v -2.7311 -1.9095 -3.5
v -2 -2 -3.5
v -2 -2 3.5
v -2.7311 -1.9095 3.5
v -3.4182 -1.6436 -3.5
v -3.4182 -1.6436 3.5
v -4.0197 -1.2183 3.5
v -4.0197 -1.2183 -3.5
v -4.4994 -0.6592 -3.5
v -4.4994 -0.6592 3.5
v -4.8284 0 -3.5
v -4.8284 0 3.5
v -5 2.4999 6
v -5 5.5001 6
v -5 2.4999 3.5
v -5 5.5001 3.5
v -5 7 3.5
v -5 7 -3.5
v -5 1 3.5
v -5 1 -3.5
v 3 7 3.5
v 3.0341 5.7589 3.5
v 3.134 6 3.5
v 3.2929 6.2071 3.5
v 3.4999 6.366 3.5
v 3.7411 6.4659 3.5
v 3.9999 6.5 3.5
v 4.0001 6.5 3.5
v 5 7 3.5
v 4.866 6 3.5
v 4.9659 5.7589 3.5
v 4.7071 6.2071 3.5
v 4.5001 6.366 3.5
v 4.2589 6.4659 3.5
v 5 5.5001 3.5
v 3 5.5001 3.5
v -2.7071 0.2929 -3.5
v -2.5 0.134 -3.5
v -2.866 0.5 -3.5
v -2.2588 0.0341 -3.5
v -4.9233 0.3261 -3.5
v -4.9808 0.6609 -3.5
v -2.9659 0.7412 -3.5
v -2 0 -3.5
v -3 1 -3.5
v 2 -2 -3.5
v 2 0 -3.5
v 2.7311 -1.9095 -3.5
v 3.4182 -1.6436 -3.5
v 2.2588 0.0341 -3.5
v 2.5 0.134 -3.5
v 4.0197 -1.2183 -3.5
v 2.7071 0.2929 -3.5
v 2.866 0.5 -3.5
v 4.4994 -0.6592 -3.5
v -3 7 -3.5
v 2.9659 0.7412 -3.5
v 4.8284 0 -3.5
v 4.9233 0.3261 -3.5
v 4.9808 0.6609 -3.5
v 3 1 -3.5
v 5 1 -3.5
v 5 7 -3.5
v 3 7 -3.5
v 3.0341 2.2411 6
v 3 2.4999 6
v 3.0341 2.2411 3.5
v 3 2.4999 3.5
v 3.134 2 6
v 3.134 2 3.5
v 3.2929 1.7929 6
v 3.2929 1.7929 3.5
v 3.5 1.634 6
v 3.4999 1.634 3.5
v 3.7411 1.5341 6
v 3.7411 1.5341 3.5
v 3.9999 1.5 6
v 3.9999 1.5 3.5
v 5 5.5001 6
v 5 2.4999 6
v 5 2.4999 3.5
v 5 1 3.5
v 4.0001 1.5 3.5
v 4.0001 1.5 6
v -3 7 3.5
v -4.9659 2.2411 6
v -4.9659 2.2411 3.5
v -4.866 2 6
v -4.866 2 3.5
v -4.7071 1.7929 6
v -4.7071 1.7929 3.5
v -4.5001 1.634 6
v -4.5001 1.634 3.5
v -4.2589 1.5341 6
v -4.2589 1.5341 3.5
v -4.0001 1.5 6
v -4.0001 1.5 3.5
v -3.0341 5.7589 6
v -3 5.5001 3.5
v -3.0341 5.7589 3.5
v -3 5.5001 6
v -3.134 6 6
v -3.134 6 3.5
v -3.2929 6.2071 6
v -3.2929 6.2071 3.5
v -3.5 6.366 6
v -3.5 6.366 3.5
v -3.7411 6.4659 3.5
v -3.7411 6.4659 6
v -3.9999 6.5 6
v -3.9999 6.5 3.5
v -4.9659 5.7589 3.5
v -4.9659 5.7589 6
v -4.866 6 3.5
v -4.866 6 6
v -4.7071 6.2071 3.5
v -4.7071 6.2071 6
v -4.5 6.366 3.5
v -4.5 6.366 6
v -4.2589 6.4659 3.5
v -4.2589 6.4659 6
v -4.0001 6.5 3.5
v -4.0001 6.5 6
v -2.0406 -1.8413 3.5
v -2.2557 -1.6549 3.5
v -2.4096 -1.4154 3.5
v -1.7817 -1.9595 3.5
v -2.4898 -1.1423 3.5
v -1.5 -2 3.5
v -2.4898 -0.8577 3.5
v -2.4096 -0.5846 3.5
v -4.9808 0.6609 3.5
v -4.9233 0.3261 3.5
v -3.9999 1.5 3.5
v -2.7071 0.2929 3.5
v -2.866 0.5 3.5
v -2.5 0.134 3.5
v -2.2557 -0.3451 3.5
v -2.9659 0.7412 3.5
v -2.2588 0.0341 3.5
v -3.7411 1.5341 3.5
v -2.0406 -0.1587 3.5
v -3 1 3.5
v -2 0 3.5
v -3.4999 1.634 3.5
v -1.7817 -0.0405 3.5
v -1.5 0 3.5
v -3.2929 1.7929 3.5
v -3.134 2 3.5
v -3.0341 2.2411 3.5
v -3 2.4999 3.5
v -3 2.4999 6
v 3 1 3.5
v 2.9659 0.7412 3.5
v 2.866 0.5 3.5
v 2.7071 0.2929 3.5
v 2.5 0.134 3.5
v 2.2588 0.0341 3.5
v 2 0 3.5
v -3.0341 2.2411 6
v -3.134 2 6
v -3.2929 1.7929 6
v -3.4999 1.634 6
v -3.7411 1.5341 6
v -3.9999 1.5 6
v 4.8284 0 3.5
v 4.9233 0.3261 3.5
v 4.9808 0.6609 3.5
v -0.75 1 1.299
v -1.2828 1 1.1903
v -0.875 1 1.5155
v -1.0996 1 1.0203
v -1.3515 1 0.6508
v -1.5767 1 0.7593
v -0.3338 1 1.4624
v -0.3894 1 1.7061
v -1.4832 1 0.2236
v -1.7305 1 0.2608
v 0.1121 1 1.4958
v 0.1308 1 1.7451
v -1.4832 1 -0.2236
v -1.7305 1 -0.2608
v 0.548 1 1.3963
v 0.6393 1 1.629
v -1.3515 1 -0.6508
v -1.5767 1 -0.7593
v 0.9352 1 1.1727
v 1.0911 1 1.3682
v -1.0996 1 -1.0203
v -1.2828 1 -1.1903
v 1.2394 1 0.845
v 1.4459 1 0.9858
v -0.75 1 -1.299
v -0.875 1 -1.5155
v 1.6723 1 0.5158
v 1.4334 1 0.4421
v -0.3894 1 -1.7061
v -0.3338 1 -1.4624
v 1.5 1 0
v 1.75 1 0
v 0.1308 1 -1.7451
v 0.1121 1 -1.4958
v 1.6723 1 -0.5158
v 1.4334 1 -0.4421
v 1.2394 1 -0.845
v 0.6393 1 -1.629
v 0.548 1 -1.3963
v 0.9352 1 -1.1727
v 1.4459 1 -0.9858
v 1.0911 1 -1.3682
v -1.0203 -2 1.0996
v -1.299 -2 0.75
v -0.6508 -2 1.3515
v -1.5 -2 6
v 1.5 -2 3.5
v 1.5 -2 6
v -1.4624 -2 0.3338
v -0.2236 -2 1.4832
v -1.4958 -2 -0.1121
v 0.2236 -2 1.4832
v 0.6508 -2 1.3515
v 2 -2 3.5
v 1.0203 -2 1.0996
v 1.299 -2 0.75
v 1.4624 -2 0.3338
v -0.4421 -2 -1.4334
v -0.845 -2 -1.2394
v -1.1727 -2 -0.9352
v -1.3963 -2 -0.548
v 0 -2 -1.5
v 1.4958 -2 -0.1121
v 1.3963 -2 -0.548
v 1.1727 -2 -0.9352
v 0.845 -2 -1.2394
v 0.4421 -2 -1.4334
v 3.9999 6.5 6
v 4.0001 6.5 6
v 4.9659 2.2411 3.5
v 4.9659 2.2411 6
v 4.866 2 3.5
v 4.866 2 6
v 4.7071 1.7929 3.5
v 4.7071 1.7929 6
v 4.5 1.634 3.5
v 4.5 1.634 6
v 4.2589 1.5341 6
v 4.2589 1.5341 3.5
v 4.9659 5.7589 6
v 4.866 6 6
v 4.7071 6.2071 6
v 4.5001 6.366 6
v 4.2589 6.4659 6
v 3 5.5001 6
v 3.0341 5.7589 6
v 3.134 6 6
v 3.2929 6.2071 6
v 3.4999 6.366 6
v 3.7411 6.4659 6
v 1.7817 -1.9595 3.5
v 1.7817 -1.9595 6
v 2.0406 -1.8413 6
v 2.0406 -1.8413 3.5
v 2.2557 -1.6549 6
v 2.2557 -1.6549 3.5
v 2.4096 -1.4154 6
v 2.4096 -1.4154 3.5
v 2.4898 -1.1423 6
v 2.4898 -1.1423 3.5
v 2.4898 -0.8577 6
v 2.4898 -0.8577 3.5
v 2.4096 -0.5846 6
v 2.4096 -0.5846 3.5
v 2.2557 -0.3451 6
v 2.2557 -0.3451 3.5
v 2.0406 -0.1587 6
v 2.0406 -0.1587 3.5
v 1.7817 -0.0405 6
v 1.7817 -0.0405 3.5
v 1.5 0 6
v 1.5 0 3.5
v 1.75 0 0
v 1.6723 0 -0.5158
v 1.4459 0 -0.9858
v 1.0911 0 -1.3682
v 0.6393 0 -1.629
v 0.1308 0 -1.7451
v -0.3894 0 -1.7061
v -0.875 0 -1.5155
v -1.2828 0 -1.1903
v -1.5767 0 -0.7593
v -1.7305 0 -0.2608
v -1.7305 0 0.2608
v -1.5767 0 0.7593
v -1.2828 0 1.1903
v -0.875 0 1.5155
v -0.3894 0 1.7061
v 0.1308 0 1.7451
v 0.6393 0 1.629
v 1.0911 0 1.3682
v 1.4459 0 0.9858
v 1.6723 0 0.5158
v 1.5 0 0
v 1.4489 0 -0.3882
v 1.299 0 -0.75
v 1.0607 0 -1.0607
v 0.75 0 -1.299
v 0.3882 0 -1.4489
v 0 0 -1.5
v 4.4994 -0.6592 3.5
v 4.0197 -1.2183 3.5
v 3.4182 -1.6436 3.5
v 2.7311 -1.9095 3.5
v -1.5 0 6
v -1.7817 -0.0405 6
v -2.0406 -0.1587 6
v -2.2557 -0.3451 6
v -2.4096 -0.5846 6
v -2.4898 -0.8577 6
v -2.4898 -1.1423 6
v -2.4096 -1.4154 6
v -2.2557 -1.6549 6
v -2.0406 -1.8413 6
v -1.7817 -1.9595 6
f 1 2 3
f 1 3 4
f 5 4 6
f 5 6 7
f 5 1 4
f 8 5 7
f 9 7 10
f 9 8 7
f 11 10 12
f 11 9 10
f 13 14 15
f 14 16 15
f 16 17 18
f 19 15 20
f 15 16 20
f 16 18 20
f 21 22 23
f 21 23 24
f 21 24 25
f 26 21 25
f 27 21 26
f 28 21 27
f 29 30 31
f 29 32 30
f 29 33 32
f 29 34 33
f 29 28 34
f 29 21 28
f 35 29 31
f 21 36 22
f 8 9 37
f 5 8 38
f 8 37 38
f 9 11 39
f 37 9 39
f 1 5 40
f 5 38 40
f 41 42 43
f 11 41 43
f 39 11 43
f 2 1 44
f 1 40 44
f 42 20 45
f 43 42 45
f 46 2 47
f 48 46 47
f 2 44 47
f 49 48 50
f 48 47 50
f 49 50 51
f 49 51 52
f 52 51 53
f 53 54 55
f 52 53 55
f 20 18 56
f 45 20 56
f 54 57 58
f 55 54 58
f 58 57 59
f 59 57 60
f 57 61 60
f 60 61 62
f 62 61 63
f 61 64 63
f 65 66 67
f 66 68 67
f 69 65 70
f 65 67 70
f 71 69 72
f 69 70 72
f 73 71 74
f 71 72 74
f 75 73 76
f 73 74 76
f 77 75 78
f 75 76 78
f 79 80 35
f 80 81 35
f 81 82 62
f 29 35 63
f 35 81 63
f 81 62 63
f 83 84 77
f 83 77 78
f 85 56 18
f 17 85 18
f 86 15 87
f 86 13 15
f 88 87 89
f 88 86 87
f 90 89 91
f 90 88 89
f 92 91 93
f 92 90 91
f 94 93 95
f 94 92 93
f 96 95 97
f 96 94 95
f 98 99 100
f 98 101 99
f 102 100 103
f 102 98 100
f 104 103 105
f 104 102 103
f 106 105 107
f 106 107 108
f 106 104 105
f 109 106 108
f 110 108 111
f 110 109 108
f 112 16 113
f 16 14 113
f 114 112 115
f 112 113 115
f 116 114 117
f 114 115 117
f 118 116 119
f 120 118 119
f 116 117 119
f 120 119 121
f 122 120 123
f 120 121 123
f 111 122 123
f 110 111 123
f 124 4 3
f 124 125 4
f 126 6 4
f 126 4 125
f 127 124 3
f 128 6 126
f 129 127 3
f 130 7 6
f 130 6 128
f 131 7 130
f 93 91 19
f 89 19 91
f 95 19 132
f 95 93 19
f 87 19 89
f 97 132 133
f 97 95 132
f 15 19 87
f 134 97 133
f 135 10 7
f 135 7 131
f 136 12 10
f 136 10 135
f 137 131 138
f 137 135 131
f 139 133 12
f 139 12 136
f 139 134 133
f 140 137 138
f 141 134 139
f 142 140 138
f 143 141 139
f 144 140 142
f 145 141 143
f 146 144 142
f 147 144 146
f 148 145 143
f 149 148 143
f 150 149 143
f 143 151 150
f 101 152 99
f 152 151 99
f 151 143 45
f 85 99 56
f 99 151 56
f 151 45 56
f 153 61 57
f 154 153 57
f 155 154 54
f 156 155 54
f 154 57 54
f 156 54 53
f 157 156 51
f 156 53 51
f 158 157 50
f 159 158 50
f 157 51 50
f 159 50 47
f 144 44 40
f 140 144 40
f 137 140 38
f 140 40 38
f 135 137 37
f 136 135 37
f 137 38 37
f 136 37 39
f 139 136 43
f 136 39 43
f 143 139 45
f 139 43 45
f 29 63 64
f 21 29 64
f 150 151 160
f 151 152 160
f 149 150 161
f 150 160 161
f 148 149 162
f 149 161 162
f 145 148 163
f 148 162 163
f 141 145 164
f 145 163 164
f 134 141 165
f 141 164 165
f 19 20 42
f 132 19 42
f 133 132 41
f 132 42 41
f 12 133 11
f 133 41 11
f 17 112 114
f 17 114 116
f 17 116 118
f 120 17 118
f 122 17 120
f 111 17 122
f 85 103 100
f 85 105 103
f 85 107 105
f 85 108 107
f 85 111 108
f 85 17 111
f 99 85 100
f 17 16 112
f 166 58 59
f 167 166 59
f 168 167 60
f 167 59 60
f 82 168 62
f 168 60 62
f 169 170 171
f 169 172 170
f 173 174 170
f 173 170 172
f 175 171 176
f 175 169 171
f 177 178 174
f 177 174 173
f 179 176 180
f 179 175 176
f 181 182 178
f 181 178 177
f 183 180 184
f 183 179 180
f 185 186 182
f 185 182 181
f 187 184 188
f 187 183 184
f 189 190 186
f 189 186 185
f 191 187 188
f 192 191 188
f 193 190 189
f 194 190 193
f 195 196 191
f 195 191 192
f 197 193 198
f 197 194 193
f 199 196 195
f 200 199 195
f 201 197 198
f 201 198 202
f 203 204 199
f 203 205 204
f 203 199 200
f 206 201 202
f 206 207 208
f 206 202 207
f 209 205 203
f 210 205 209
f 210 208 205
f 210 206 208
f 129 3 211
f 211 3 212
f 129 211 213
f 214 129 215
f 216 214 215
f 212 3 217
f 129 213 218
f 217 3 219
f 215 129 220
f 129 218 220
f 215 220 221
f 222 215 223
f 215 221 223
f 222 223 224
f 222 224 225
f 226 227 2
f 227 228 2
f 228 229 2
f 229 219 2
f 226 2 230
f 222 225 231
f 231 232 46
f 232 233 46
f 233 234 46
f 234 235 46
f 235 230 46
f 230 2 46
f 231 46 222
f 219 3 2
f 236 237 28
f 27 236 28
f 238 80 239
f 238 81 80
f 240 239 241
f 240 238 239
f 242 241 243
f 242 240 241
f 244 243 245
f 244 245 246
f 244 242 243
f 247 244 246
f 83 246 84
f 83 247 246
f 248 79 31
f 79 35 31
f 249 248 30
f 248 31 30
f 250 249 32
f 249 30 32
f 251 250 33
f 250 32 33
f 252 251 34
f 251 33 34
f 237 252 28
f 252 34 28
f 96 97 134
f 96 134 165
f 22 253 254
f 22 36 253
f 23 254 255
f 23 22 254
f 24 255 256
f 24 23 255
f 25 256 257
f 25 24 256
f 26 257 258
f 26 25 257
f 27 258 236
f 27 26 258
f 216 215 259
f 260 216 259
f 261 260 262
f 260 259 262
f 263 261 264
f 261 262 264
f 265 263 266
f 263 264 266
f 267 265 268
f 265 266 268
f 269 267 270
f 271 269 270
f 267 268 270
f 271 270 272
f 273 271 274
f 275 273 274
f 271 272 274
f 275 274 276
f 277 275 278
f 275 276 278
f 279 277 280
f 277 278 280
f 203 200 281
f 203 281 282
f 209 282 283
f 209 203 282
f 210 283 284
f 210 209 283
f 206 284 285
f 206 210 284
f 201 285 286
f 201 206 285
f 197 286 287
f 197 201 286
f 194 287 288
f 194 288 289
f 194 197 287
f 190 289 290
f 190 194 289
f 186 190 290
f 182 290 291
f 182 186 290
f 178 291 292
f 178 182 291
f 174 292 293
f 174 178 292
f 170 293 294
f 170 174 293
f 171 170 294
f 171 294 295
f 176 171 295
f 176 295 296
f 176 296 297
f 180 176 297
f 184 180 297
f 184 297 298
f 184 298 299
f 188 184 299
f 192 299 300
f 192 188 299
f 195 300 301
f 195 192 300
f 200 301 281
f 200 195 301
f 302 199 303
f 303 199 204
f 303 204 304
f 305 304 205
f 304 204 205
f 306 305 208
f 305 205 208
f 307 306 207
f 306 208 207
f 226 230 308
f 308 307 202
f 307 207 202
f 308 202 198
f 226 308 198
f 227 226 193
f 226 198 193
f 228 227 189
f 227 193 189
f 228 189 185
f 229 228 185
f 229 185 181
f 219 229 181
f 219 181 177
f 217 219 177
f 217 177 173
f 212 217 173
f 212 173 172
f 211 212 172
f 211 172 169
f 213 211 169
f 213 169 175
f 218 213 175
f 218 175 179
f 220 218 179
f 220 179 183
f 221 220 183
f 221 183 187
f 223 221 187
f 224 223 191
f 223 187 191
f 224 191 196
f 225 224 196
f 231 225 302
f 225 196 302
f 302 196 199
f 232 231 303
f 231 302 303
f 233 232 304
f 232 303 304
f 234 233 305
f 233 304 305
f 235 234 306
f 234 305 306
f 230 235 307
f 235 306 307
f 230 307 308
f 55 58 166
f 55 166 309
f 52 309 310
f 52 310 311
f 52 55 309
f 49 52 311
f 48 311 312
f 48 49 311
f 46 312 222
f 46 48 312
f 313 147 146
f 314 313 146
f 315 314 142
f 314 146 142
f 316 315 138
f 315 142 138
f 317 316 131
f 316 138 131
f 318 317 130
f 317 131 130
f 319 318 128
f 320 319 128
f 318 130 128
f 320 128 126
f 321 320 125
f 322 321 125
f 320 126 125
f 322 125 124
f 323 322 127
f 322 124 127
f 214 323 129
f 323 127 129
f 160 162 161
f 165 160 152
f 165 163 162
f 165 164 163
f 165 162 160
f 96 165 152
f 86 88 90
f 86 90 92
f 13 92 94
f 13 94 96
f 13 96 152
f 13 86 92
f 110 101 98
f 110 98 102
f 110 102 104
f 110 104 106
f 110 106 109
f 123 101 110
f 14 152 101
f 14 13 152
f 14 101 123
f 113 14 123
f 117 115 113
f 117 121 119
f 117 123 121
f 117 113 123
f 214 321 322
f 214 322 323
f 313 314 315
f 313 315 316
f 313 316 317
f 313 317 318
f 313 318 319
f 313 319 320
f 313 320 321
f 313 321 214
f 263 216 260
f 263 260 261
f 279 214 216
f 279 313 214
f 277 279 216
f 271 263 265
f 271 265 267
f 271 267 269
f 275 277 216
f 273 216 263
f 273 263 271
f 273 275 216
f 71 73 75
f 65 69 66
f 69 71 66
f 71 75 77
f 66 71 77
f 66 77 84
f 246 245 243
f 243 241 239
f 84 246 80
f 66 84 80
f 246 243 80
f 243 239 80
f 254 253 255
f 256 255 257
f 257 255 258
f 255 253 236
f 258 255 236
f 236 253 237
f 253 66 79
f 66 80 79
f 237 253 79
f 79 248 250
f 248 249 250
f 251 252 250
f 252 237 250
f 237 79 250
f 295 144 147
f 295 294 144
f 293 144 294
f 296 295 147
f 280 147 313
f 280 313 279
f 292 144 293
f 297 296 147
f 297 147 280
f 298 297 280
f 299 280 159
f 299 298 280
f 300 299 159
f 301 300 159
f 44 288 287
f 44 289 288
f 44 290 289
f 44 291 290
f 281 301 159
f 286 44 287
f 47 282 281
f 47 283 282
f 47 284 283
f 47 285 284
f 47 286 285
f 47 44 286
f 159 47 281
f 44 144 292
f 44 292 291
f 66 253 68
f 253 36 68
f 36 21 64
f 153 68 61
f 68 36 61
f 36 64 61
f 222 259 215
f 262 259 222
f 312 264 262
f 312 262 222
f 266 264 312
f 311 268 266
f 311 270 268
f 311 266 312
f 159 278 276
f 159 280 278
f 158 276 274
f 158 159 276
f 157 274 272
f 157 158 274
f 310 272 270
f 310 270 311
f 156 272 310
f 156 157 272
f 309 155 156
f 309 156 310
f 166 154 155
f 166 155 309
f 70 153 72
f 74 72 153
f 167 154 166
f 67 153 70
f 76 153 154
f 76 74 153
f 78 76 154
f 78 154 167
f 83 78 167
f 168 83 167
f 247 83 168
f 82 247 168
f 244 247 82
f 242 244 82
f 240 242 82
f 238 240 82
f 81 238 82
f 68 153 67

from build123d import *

# Parameters (mm, degrees)
EXTRU_MINCE1_DEPTH      = 3.5
D_PLIAGE_START          = -3.5
D_PLIAGE_2_OUTLINE_W    = 2
D_PLIAGE_2_OUTLINE_H    = 7
D_PLIAGE_2_DEPTH        = 7
D_PLIAGE_2_2_OUTLINE_W  = 6.141592654
D_PLIAGE_2_2_OUTLINE_H  = 2
D_PLIAGE_2_2_DEPTH      = 7
PLIAGE_START            = -3.5
PLIAGE_2_DEPTH          = 7
PLIAGE_2_2_DEPTH        = 7
ENL_V_MAT_EXTRU_1_REACH = 11.287
ESQUISSE10_R            = 1.5
ESQUISSE11_W            = 2.5
ESQUISSE11_H            = 5
PATTE1_DEPTH            = 2
CONG_2_R                = 1
ESQUISSE13_W            = 2.5
ESQUISSE13_H            = 5
PATTE2_DEPTH            = 2
CONG_9_R                = 1
EXTRUSION2_DEPTH        = 2.5
EXTRU_MINCE2_START      = 1
ESQUISSE16_R            = 1.75
ESQUISSE16_R_2          = 1.5
EXTRU_MINCE2_DEPTH      = 1


# Read off the part's stored shape, not the designer's step: Dépliage 2, Pliage 2
# Sheet-metal steps are written as plain solids
with BuildPart() as part:
    # Esquisse1 → Extru.-Mince1 (new, symmetric)
    with BuildSketch(Plane.XY):
        Polygon((-3, 7), (-3, 0), (3, 0), (3, 7), (5, 7), (5, -2), (-5, -2), (-5, 7), align=None)
    extrude(amount=EXTRU_MINCE1_DEPTH, both=True)

    # Dépliage 2 outline → Dépliage 2 (cut)
    with BuildSketch(Plane.XY.offset(D_PLIAGE_START)):
        with Locations((4, 3.5)):
            Rectangle(D_PLIAGE_2_OUTLINE_W, D_PLIAGE_2_OUTLINE_H)
        with Locations((-4, 3.5)):
            Rectangle(D_PLIAGE_2_OUTLINE_W, D_PLIAGE_2_OUTLINE_H)
    extrude(amount=D_PLIAGE_2_DEPTH, mode=Mode.SUBTRACT)

    # D_pliage 2 2 outline → D_pliage 2 2 (add)
    with BuildSketch(Plane.XY.offset(D_PLIAGE_START)):
        with Locations((8.070796327, -1)):
            Rectangle(D_PLIAGE_2_2_OUTLINE_W, D_PLIAGE_2_2_OUTLINE_H)
        with Locations((-8.070796327, -1)):
            Rectangle(D_PLIAGE_2_2_OUTLINE_W, D_PLIAGE_2_2_OUTLINE_H)
    extrude(amount=D_PLIAGE_2_2_DEPTH)

    # Pliage 2 outline → Pliage 2 (cut)
    with BuildSketch(Plane.XY.offset(PLIAGE_START)):
        with BuildLine():
            ThreePointArc((-2, -2), (-3.732050808, -1.449489743), (-4.828427125, 0))
            Line((-4.828427125, 0), (-11.141592654, 0))
            Line((-11.141592654, 0), (-11.141592654, -2))
            Line((-11.141592654, -2), (-2, -2))
        make_face()
        with BuildLine():
            Line((11.141592654, 0), (4.828427125, 0))
            ThreePointArc((4.828427125, 0), (3.732050808, -1.449489743), (2, -2))
            Line((2, -2), (11.141592654, -2))
            Line((11.141592654, -2), (11.141592654, 0))
        make_face()
    extrude(amount=PLIAGE_2_DEPTH, mode=Mode.SUBTRACT)

    # Pliage 2 2 outline → Pliage 2 2 (add)
    with BuildSketch(Plane.XY.offset(PLIAGE_START)):
        with BuildLine():
            Line((-3, 1), (-3, 7))
            Line((-3, 7), (-5, 7))
            Line((-5, 7), (-5, 1))
            ThreePointArc((-5, 1), (-4.956795679, 0.492694064), (-4.828427125, 0))
            Line((-4.828427125, 0), (-2, 0))
            ThreePointArc((-2, 0), (-2.707106781, 0.292893219), (-3, 1))
        make_face()
        with BuildLine():
            Line((5, 7), (3, 7))
            Line((3, 7), (3, 1))
            ThreePointArc((3, 1), (2.707106781, 0.292893219), (2, 0))
            Line((2, 0), (4.828427125, 0))
            ThreePointArc((4.828427125, 0), (4.956795679, 0.492694064), (5, 1))
            Line((5, 1), (5, 7))
        make_face()
    extrude(amount=PLIAGE_2_2_DEPTH)

    # Esquisse10 → Enlèv. mat.-Extru.1 (cut, up to next)
    with BuildSketch(Plane(origin=(0, 0, 0), x_dir=(1, 0, 0), z_dir=(0, 1, 0)), mode=Mode.PRIVATE) as enl_v_mat_extru_1_sk1:
        with Locations(Location((0, 0, 0), (0, 0, 90))):
            Circle(ESQUISSE10_R)
    enl_v_mat_extru_1_tool1 = extrude(enl_v_mat_extru_1_sk1.sketch, amount=-ENL_V_MAT_EXTRU_1_REACH, mode=Mode.PRIVATE) & part.part
    add(enl_v_mat_extru_1_tool1.solids().sort_by_distance((0, 0, 0))[0], mode=Mode.SUBTRACT)

    # Esquisse11 → Patte1 (add)
    with BuildSketch(Plane.ZY.offset(5)):
        with Locations((4.75, 4)):
            Rectangle(ESQUISSE11_W, ESQUISSE11_H)
    extrude(amount=-PATTE1_DEPTH)

    # Congé2
    cong_2_edges = [part.edges().sort_by_distance(p)[0] for p in [
        (-5, 6.5, 4.75),
        (-3, 6.5, 4.75),
        (-5, 1.5, 4.75),
        (-3, 1.5, 4.75),
    ]]
    fillet(cong_2_edges, radius=CONG_2_R - 0.0001)  # a hair under: the kernel refuses the full size

    # Esquisse13 → Patte2 (add)
    with BuildSketch(Plane(origin=(5, 0, 0), x_dir=(0, 0, -1), z_dir=(1, 0, 0))):
        with Locations((-4.75, 4)):
            Rectangle(ESQUISSE13_W, ESQUISSE13_H)
    extrude(amount=-PATTE2_DEPTH)

    # Congé9
    cong_9_edges = [part.edges().sort_by_distance(p)[0] for p in [
        (5, 6.5, 4.75),
        (3, 6.5, 4.75),
        (5, 1.5, 4.75),
        (3, 1.5, 4.75),
    ]]
    fillet(cong_9_edges, radius=CONG_9_R - 0.0001)  # a hair under: the kernel refuses the full size

    # Esquisse15 → Extrusion2 (add)
    with BuildSketch(Plane.XY.offset(3.5)):
        with BuildLine():
            Line((1.5, 0), (-1.5, 0))
            ThreePointArc((-1.5, 0), (-2.5, -1), (-1.5, -2))
            Line((-1.5, -2), (1.5, -2))
            ThreePointArc((1.5, -2), (2.5, -1), (1.5, 0))
        make_face()
    extrude(amount=EXTRUSION2_DEPTH)

    # Esquisse16 → Extru.-Mince2 (add)
    with BuildSketch(Plane(origin=(0, 0, 0), x_dir=(1, 0, 0), z_dir=(0, 1, 0)).offset(EXTRU_MINCE2_START)):
        Circle(ESQUISSE16_R)
        Circle(ESQUISSE16_R_2, mode=Mode.SUBTRACT)
    extrude(amount=-EXTRU_MINCE2_DEPTH)


solid = part.part
